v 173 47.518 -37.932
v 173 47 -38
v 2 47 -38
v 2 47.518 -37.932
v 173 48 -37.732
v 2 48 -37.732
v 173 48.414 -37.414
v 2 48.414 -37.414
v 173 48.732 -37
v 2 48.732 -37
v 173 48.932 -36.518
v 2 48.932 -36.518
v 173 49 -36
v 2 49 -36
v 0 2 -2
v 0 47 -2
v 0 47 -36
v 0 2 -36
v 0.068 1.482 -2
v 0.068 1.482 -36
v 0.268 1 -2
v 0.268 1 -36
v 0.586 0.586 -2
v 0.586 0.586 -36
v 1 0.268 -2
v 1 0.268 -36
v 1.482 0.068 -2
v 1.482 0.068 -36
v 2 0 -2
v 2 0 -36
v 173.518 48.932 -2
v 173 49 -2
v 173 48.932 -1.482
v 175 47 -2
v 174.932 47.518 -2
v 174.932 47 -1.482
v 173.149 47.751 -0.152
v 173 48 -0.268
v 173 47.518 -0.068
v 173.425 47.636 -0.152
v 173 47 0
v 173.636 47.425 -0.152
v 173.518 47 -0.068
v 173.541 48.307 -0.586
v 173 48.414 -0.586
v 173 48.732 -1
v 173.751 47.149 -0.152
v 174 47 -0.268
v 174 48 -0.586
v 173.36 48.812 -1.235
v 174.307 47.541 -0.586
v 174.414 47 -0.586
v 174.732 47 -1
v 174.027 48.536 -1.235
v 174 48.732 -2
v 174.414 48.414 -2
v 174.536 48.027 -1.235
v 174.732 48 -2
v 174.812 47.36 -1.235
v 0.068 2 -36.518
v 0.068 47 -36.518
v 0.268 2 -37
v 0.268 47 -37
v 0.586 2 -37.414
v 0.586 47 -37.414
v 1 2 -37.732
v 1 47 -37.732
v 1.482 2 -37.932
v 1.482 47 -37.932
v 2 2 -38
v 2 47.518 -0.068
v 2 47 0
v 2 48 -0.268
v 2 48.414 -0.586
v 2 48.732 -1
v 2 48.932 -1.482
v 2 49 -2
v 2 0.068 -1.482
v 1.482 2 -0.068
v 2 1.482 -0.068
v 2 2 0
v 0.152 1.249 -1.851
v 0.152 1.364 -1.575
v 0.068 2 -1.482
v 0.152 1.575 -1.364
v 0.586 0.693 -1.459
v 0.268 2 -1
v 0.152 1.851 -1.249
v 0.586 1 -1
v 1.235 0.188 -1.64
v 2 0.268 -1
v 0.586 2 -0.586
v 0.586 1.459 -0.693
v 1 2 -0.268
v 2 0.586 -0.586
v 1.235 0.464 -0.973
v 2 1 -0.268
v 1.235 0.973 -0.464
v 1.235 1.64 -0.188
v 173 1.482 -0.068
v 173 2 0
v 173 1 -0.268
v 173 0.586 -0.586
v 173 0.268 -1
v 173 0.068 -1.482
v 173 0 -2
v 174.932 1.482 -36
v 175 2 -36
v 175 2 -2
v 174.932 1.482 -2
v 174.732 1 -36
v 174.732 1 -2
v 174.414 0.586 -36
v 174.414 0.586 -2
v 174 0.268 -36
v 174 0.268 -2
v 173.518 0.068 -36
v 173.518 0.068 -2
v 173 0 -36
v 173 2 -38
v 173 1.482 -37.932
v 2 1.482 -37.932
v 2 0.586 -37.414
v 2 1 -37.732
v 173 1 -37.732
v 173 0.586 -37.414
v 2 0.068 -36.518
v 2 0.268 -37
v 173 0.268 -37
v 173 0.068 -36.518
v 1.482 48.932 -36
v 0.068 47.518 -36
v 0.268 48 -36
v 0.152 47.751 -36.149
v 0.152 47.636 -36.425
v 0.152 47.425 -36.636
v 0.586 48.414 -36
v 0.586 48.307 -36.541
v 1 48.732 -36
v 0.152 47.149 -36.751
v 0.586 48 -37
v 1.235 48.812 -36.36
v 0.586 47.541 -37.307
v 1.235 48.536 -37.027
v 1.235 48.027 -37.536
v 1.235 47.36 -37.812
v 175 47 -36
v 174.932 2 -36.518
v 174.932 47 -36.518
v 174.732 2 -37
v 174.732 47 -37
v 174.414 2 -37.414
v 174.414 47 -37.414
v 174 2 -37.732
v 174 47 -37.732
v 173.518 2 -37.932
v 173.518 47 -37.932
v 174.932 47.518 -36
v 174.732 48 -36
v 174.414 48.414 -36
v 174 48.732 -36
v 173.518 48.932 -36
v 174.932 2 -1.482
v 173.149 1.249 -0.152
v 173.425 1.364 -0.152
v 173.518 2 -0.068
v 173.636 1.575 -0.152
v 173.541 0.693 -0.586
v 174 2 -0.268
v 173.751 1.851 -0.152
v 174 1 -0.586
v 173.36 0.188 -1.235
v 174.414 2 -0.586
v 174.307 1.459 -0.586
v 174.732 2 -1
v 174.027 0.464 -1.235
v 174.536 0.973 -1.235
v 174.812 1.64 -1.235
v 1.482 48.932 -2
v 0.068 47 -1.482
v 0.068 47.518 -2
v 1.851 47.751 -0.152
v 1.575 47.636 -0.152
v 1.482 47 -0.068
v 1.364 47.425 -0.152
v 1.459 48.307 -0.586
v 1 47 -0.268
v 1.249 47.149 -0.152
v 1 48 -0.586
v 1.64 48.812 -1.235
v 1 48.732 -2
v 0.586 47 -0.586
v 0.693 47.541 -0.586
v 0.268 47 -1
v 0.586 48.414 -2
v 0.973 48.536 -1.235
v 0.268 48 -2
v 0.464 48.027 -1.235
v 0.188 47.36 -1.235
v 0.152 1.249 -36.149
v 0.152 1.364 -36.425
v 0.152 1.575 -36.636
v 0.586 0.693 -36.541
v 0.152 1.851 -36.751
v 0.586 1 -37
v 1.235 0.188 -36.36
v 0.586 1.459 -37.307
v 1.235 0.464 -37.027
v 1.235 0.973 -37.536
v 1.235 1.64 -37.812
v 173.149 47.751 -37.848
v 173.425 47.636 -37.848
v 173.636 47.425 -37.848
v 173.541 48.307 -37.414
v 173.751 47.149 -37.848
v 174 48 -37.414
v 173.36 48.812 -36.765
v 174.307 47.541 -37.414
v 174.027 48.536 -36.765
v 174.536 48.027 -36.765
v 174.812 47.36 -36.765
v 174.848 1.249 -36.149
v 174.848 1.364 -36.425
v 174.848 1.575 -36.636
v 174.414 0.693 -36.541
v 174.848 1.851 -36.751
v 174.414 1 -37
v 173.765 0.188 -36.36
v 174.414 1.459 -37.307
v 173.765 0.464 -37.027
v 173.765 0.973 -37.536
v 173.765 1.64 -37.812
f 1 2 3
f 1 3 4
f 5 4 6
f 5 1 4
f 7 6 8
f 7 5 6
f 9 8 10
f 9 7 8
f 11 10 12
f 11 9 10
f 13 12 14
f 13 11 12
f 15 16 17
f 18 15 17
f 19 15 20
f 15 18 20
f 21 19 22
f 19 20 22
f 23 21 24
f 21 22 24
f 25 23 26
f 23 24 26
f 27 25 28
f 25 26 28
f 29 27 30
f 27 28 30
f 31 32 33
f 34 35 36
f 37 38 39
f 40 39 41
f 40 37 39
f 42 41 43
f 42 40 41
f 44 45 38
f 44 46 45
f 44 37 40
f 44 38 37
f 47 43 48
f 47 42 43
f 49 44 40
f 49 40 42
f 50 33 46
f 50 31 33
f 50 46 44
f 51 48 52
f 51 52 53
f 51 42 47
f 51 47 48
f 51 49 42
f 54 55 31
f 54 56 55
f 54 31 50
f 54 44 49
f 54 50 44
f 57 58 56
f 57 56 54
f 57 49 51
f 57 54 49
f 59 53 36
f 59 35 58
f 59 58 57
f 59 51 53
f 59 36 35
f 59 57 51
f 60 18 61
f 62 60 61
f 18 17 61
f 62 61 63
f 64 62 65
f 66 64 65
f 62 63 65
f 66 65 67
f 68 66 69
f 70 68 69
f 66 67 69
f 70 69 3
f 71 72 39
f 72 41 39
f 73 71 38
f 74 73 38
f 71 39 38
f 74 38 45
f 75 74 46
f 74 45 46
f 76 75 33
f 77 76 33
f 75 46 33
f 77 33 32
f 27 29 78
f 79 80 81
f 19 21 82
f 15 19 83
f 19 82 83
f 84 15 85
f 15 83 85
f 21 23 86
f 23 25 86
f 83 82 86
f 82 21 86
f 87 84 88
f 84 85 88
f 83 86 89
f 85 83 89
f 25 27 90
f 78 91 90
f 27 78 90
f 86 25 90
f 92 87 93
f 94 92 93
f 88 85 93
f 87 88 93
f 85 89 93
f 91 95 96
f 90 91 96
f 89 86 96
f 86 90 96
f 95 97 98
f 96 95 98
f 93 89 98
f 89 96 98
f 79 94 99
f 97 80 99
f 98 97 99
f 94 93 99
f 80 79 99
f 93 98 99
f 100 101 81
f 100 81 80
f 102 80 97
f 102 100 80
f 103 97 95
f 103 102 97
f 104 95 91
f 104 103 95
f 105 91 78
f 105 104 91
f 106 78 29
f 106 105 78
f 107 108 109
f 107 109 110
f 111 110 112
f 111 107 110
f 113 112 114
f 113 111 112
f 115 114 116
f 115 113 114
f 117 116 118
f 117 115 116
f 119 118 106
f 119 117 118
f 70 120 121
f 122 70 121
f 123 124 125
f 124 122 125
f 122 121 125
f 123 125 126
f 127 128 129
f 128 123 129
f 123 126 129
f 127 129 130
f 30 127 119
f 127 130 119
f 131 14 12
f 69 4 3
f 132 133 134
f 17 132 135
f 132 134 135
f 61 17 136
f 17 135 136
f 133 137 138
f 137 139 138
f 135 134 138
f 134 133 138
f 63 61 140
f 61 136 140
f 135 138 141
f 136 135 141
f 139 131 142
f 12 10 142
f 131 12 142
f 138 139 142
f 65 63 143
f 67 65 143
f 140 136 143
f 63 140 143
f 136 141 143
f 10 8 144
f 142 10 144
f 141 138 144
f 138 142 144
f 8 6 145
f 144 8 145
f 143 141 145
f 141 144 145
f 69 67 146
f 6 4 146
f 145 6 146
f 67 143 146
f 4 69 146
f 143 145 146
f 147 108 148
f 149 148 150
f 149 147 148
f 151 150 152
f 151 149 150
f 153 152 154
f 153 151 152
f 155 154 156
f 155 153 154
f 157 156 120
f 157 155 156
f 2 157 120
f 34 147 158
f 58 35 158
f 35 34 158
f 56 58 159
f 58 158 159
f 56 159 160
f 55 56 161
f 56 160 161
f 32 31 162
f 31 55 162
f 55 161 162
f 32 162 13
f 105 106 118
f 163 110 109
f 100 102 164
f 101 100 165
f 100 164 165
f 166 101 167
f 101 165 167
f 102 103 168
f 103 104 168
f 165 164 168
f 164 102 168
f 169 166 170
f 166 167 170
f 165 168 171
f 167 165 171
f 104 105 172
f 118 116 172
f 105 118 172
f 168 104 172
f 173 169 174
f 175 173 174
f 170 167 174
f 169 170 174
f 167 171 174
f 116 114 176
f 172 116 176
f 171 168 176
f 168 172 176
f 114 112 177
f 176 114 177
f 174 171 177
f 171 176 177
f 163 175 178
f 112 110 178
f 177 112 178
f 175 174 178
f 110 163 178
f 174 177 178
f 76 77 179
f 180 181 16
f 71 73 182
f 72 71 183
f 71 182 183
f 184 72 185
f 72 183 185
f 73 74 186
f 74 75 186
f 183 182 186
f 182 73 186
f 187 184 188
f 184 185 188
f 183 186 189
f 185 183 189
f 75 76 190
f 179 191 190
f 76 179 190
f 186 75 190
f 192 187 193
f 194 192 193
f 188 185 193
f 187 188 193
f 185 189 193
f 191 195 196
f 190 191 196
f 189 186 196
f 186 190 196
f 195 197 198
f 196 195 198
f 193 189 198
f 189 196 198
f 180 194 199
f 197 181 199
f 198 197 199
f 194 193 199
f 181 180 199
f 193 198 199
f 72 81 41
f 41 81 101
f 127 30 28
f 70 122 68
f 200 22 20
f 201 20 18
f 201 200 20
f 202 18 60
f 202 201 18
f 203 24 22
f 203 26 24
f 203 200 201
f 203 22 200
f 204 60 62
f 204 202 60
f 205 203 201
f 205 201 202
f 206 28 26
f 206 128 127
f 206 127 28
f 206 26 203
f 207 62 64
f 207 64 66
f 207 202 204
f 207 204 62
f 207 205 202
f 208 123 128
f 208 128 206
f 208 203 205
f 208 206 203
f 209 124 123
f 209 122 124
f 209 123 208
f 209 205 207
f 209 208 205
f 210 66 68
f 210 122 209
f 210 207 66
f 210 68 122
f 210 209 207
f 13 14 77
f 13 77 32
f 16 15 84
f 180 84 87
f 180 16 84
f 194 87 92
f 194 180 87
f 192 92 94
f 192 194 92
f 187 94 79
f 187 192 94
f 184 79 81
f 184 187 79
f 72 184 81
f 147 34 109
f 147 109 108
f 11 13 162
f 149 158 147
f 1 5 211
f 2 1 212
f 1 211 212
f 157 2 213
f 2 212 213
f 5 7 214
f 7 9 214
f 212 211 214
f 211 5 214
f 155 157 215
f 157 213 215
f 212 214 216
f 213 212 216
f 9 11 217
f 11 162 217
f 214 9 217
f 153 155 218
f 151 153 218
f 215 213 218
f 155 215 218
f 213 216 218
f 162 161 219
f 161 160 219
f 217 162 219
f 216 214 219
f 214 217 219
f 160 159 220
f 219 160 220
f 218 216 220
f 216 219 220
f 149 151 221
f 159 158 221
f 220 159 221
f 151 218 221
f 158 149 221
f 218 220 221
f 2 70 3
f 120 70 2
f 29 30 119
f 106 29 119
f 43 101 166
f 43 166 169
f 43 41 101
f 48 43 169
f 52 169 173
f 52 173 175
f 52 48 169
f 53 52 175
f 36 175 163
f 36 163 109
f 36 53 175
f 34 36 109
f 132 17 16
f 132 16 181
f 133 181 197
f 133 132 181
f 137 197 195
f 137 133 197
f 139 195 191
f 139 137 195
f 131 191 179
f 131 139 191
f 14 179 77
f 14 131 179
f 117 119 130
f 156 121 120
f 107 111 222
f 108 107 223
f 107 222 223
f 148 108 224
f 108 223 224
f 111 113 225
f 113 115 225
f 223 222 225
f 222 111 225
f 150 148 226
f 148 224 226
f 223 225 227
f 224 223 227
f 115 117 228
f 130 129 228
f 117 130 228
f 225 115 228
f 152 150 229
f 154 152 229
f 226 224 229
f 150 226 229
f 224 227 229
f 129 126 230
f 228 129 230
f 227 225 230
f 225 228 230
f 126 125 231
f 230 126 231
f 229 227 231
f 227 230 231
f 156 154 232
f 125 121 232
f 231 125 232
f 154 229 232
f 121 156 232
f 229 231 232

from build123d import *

# Parameters (mm, degrees)
SKETCH1_W           = 175
SKETCH1_H           = 38
BOSS_EXTRUDE1_DEPTH = 49
FILLET1_R           = 2


with BuildPart() as part:
    # Sketch1 → Boss-Extrude1 (new body)
    with BuildSketch(Plane(origin=(0, 0, 0), x_dir=(1, 0, 0), z_dir=(0, 1, 0))):
        with Locations((87.5, 19)):
            Rectangle(SKETCH1_W, SKETCH1_H)
    extrude(amount=BOSS_EXTRUDE1_DEPTH)

    # Fillet1
    fillet1_edges = [part.edges().sort_by_distance(p)[0] for p in [
        (175, 49, -19),
        (87.5, 49, -38),
        (0, 49, -19),
        (87.5, 0, -38),
        (175, 0, -19),
        (87.5, 0, 0),
        (0, 0, -19),
        (87.5, 49, 0),
        (0, 24.5, -38),
        (175, 24.5, -38),
        (175, 24.5, 0),
        (0, 24.5, 0),
    ]]
    fillet(fillet1_edges, radius=FILLET1_R)


solid = part.part
